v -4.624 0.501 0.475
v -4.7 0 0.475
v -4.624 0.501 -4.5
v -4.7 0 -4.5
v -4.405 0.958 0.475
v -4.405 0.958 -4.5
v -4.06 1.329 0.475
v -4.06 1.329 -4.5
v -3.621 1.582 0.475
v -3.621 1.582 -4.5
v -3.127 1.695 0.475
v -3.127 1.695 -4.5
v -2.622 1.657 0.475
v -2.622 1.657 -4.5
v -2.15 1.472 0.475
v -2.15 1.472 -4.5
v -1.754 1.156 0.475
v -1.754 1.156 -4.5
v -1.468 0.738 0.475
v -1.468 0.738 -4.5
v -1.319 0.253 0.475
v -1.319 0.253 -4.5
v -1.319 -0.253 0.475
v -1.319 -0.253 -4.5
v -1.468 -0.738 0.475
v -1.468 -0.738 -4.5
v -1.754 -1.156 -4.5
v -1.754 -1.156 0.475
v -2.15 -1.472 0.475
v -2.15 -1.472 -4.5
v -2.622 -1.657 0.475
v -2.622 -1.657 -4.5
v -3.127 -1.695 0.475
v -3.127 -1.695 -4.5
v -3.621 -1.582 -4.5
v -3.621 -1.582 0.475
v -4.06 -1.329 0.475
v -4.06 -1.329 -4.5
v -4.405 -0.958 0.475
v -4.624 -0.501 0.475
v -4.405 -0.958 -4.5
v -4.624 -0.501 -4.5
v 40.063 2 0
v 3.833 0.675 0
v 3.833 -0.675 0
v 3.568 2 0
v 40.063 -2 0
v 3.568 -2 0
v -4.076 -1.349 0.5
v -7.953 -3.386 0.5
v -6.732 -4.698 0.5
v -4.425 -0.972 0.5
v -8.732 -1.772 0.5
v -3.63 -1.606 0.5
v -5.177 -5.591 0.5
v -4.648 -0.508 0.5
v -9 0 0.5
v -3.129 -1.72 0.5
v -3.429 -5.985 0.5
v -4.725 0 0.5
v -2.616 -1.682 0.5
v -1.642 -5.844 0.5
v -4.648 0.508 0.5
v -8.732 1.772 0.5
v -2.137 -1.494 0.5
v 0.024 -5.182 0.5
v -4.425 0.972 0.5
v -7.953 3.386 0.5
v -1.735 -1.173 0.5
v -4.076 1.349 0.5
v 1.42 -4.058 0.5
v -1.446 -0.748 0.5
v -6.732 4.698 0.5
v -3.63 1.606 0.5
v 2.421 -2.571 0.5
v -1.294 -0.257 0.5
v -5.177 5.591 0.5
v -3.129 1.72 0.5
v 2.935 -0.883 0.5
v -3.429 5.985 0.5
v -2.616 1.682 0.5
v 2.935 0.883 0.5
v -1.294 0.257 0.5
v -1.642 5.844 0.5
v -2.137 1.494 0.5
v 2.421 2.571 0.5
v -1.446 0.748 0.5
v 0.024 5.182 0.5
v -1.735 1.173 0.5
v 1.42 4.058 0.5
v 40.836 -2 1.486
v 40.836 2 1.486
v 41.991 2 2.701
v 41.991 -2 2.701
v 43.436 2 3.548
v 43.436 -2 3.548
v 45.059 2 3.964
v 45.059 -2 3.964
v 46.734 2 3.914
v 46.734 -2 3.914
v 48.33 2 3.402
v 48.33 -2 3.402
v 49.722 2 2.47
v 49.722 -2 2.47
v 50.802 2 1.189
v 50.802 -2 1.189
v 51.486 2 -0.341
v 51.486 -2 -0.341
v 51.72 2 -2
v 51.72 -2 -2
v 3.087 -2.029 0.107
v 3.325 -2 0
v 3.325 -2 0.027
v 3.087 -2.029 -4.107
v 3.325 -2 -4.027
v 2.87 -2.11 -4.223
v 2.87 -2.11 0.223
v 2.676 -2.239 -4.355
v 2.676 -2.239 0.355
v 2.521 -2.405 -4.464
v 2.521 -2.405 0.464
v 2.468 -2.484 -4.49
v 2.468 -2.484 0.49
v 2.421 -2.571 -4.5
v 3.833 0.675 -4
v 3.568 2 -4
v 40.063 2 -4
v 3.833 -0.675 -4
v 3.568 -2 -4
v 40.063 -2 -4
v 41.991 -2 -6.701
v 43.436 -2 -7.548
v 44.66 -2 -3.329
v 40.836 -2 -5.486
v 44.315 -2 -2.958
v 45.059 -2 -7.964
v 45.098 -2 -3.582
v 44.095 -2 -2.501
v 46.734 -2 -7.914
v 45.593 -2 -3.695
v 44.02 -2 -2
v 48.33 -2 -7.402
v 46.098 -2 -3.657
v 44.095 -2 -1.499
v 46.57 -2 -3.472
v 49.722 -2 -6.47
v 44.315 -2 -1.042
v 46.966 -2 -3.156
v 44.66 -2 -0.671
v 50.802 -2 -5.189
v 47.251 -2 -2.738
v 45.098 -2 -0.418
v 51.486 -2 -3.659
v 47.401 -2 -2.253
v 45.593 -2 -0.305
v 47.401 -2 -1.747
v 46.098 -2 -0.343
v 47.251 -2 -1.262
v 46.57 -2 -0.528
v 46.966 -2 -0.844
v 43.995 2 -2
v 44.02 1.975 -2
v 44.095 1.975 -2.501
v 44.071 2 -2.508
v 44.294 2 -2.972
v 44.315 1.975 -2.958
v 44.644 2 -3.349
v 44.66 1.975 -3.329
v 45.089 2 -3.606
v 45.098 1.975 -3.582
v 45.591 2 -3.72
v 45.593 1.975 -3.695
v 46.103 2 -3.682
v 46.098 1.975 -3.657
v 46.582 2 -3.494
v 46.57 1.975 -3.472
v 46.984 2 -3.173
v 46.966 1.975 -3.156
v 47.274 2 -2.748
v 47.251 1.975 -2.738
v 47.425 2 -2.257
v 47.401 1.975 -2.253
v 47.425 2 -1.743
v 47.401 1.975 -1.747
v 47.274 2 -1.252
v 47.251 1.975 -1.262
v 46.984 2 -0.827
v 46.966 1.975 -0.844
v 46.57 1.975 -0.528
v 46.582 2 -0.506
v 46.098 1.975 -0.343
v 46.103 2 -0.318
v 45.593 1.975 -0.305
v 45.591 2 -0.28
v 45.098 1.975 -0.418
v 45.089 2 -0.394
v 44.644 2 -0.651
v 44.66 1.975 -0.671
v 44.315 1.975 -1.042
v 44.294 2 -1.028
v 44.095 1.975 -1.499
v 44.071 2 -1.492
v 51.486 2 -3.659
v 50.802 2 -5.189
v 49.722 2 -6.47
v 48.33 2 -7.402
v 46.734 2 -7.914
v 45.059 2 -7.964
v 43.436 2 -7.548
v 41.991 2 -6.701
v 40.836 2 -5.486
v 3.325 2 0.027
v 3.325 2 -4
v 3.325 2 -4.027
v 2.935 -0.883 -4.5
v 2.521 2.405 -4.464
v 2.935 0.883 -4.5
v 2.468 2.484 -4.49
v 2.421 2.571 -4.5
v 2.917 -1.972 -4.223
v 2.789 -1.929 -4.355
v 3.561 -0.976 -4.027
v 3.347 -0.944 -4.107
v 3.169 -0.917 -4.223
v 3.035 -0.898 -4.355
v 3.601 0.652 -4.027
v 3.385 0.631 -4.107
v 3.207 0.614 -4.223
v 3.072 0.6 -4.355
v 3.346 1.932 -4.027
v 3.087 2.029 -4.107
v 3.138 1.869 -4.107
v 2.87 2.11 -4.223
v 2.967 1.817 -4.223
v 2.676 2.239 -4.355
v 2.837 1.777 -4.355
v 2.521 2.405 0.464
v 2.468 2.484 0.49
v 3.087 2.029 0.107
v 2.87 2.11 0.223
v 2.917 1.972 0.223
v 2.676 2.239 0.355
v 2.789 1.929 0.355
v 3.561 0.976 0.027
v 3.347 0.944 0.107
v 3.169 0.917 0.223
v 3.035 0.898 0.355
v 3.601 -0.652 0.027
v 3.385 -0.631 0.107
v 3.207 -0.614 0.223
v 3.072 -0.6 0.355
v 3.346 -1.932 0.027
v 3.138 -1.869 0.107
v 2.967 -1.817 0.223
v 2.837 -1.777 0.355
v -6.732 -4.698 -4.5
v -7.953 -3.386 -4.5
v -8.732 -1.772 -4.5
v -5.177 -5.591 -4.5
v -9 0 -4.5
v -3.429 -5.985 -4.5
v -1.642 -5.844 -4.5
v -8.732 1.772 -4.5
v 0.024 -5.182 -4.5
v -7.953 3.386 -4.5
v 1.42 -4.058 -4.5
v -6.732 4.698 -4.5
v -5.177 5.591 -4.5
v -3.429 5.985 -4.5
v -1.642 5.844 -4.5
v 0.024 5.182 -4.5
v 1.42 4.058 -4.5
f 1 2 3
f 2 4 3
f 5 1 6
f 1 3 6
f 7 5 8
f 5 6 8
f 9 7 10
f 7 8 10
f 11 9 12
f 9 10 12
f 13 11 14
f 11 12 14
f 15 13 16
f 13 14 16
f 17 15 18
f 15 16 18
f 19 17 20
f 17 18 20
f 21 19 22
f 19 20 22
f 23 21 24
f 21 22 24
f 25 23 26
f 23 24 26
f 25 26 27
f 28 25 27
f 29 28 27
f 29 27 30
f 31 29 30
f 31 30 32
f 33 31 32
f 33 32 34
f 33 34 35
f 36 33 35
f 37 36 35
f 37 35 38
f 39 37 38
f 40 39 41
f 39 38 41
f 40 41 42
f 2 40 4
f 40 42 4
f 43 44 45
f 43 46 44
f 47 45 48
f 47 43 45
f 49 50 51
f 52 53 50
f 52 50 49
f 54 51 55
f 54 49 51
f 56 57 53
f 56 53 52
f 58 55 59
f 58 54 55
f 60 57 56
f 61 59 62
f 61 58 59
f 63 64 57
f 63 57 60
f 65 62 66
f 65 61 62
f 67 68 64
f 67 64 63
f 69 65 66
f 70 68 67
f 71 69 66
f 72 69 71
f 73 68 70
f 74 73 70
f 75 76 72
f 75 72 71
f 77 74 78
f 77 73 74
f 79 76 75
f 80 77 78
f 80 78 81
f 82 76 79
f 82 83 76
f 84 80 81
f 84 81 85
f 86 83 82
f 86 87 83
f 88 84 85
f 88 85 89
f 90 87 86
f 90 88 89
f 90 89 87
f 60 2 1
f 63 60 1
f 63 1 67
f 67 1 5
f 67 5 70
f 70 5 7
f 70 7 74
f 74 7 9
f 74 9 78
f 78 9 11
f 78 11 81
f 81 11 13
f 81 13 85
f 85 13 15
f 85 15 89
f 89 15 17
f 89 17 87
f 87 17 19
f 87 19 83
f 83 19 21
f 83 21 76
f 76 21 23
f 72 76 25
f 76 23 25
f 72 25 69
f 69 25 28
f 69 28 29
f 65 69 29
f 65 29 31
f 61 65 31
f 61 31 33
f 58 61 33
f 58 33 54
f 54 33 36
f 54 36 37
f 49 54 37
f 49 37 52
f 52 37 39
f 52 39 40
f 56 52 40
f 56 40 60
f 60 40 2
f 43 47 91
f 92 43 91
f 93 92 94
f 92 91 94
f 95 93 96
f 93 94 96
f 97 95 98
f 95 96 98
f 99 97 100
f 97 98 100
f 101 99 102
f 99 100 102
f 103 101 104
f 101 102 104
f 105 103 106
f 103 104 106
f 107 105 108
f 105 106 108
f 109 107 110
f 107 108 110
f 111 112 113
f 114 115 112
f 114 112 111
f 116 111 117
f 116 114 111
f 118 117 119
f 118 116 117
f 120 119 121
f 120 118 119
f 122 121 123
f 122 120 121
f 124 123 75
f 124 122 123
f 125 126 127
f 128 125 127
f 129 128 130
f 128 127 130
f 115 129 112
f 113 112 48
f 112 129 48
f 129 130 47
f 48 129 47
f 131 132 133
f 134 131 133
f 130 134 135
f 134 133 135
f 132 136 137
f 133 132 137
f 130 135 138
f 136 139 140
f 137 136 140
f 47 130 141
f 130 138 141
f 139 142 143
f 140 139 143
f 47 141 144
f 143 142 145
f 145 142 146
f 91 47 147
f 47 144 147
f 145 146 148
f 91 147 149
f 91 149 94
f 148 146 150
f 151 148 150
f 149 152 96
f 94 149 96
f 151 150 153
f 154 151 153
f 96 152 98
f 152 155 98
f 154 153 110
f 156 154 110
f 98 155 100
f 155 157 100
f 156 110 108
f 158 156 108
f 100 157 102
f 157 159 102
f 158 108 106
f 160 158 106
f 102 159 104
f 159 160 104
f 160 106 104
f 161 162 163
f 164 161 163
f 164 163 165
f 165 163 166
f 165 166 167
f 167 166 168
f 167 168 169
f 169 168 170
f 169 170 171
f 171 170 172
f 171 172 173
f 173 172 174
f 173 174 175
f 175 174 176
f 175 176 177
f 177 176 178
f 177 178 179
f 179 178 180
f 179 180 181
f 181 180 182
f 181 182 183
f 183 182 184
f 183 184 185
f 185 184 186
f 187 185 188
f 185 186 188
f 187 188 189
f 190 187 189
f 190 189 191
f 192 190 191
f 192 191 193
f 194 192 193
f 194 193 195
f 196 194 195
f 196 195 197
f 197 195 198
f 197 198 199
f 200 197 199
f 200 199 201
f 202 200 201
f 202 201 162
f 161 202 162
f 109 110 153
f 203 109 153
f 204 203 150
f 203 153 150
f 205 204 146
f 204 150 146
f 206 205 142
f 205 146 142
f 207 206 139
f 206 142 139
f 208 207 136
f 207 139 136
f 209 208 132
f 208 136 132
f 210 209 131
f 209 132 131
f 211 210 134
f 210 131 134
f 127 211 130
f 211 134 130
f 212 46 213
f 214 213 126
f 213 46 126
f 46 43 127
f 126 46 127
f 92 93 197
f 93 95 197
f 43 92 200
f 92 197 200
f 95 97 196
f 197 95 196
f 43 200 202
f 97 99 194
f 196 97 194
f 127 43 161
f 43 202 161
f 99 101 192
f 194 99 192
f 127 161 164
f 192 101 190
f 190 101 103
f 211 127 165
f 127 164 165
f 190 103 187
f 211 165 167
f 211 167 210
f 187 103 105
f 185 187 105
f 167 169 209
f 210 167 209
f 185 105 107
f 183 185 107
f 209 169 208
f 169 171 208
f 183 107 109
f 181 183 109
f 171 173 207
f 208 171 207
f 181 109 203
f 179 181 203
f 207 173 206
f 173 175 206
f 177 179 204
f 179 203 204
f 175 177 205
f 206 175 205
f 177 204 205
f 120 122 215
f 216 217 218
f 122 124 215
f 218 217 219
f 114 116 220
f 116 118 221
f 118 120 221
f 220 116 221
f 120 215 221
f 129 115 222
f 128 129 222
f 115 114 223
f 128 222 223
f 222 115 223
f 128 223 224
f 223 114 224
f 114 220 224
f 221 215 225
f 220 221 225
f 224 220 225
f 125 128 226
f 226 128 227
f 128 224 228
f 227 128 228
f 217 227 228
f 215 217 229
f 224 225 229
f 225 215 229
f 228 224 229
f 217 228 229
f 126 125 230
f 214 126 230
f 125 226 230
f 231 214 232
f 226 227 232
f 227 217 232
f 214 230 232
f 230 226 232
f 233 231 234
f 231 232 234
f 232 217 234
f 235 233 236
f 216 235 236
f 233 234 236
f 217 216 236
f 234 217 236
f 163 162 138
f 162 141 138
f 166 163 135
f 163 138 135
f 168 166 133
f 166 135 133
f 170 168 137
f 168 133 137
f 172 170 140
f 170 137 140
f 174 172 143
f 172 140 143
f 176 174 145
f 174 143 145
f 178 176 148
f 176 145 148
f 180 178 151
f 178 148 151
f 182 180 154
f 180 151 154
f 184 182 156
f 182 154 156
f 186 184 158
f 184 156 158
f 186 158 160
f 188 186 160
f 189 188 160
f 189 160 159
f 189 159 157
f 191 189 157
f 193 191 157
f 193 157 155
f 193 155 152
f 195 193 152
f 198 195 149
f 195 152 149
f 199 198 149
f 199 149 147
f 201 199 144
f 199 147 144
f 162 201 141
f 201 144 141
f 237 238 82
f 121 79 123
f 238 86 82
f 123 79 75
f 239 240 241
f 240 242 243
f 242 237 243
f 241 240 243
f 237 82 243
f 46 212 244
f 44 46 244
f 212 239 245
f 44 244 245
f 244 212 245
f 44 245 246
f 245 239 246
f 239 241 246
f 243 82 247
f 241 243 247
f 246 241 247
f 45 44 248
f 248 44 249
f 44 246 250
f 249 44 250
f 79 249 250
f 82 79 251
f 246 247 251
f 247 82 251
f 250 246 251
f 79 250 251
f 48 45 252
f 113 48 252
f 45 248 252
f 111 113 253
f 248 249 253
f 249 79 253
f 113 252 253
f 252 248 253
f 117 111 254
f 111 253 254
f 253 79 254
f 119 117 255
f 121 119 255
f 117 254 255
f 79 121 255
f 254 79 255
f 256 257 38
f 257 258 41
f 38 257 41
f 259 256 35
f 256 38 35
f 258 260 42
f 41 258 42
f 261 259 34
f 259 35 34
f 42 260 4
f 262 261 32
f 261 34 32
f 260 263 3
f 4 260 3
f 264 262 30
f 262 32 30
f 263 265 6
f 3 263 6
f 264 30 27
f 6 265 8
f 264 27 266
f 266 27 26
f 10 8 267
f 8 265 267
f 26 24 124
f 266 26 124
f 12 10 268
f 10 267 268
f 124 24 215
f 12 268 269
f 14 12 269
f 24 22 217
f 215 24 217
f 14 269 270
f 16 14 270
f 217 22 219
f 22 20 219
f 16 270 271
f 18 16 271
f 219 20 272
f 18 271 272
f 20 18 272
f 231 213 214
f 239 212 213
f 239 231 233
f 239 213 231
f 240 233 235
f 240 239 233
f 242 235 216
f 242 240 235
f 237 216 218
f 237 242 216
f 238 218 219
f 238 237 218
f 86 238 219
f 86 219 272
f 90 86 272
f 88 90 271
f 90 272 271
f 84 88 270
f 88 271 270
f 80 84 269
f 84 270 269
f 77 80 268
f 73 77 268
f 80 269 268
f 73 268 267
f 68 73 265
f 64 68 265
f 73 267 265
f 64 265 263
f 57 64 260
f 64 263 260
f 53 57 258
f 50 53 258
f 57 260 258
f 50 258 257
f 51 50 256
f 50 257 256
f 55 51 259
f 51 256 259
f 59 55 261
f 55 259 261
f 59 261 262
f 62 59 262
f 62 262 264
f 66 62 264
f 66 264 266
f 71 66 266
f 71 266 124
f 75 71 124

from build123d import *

# Parameters (mm, degrees)
BOSS_EXTRUDE10_DEPTH           = 2.5
BOSS_EXTRUDE10_DEPTH_BACK      = 2.5
SKETCH7_R                      = 6
BOSS_EXTRUDE11_DEPTH           = 2
BOSS_EXTRUDE11_DEPTH_BACK      = 2
FILLET4_R                      = 1
M3_CLEARANCE_HOLE1_D           = 3.4
M3_CLEARANCE_HOLE1_CSINK_D     = 3.45
M3_CLEARANCE_HOLE1_CSINK_ANGLE = 90
M3_CLEARANCE_HOLE2_D           = 3.4
M3_CLEARANCE_HOLE2_CSINK_D     = 3.45
M3_CLEARANCE_HOLE2_CSINK_ANGLE = 90


with BuildPart() as part:
    # Sketch7 → Boss-Extrude10 (new, two sides: drawn at the far end of the back side and taken through both)
    with BuildSketch(Plane.XY.offset(-2).offset(-BOSS_EXTRUDE10_DEPTH_BACK)):
        with Locations((-3, 0)):
            Circle(SKETCH7_R)
    extrude(amount=BOSS_EXTRUDE10_DEPTH + BOSS_EXTRUDE10_DEPTH_BACK)

    # Sketch4 → Boss-Extrude11 (add, two sides: drawn at the far end of the back side and taken through both)
    with BuildSketch(Plane(origin=(0, 0, 0), x_dir=(1, 0, 0), z_dir=(0, 1, 0)).offset(-BOSS_EXTRUDE11_DEPTH_BACK)):
        with BuildLine():
            ThreePointArc((40.062693756, 4), (39.719548005, 2), (40.062693756, 0))
            Line((40.062693756, 0), (45.719548005, 0))
            Line((45.719548005, 0), (45.719548005, 4))
            Line((45.719548005, 4), (40.062693756, 4))
        make_face()
        with BuildLine():
            Line((45.719548005, 0), (40.062693756, 0))
            ThreePointArc((40.062693756, 0), (46.734159878, -3.913591358), (51.719548005, 2))
            ThreePointArc((51.719548005, 2), (46.734159878, 7.913591358), (40.062693756, 4))
            Line((40.062693756, 4), (45.719548005, 4))
            Line((45.719548005, 4), (45.719548005, 0))
        make_face()
        with BuildLine():
            Line((0, 4), (0, 0))
            Line((0, 0), (40.062693756, 0))
            ThreePointArc((40.062693756, 0), (39.719548005, 2), (40.062693756, 4))
            Line((40.062693756, 4), (0, 4))
        make_face()
    extrude(amount=BOSS_EXTRUDE11_DEPTH + BOSS_EXTRUDE11_DEPTH_BACK)

    # Fillet4
    # the kernel refuses this fillet: 1 mm, written as the material it adds along each edge
    with BuildSketch(Plane(origin=(2.656854249, 2, 0), x_dir=(-0.381458859418171, 0.9243858169462511, 1.7363680755605478e-15), z_dir=(0, 0, -1)), Plane(origin=(2.656854249, -2, -4), x_dir=(-0.3814588594181449, -0.924385816946262, 1.7363680755604279e-15), z_dir=(0, 0, 1))) as fillet4_piece_1:
        with BuildLine():
            CenterArc((0.669685328, 0.998672259), FILLET4_R, 202.42407708, 64.623066475)
            Line((-0.254700489, 0.6172134), (-0.273188205, 0.609584223))
            Line((-0.273188205, 0.609584223), (-0.018487716, -0.007629177))
            Line((-0.018487716, -0.007629177), (0.001030285, -0.019973445))
            ThreePointArc((0.001030285, -0.019973445), (0.309085536, -0.012033556), (0.617140787, -0.019973445))
            Line((0.617140787, -0.019973445), (0.618171072, 0))
        make_face()
    extrude(amount=4)
    with BuildSketch(Plane(origin=(-3, 0, -4), x_dir=(0.764399035602867, -0.6447434484889372, 0), z_dir=(-0.6447434484889372, -0.764399035602867, 0))) as fillet4_piece_2_section:
        with BuildLine():
            CenterArc((6.866025404, -1), FILLET4_R, 90, 60)
            Line((6.866025404, 0), (6.866025404, 0.02))
            Line((6.866025404, 0.02), (6, 0.02))
            Line((6, 0.02), (5.98, 0))
            ThreePointArc((5.98, 0), (5.98, -0.25), (5.982679492, -0.49))
            Line((5.982679492, -0.49), (6, -0.5))
        make_face()
    fillet4_piece_2 = revolve(axis=Axis((-3, 0, -4), (0, 0, 1)), revolution_arc=40.146442844, mode=Mode.PRIVATE)
    fillet4_piece_2 = split(fillet4_piece_2, bisect_by=Plane(origin=(3.105396532, -2, -4.129597007), z_dir=(0, 1, 0)), keep=Keep.TOP, mode=Mode.PRIVATE)
    add(fillet4_piece_2)
    with BuildSketch(Plane(origin=(-3, 0, 0), x_dir=(0.7643990356028665, 0.6447434484889378, 0), z_dir=(-0.6447434484889378, 0.7643990356028665, 0))) as fillet4_piece_3_section:
        with BuildLine():
            CenterArc((6.866025404, -1), FILLET4_R, 90, 60)
            Line((6.866025404, 0), (6.866025404, 0.02))
            Line((6.866025404, 0.02), (6, 0.02))
            Line((6, 0.02), (5.98, 0))
            ThreePointArc((5.98, 0), (5.98, -0.25), (5.982679492, -0.49))
            Line((5.982679492, -0.49), (6, -0.5))
        make_face()
    fillet4_piece_3 = revolve(axis=Axis((-3, 0, 0), (0, 0, -1)), revolution_arc=40.146442844, mode=Mode.PRIVATE)
    fillet4_piece_3 = split(fillet4_piece_3, bisect_by=Plane(origin=(3.105396532, 2, 0.129597007), z_dir=(0, -1, 0)), keep=Keep.TOP, mode=Mode.PRIVATE)
    add(fillet4_piece_3)
    with BuildSketch(Plane(origin=(-3, 0, 0), x_dir=(1, 0, 0), z_dir=(0, 1, 0))) as fillet4_piece_4_section:
        with BuildLine():
            CenterArc((6.866025404, -1), FILLET4_R, 90, 60)
            Line((6.866025404, 0), (6.866025404, 0.02))
            Line((6.866025404, 0.02), (6, 0.02))
            Line((6, 0.02), (5.98, 0))
            ThreePointArc((5.98, 0), (5.98, -0.25), (5.982679492, -0.49))
            Line((5.982679492, -0.49), (6, -0.5))
        make_face()
    fillet4_piece_4 = revolve(axis=Axis((-3, 0, 0), (0, 0, -1)), revolution_arc=40.146442844, mode=Mode.PRIVATE)
    fillet4_piece_4 = split(fillet4_piece_4, bisect_by=Plane(origin=(3.105396981, -2, 0.129596926), z_dir=(0, 1, 0)), keep=Keep.TOP, mode=Mode.PRIVATE)
    add(fillet4_piece_4)
    with BuildSketch(Plane(origin=(-3, 0, -4), x_dir=(1, 0, 0), z_dir=(0, -1, 0))) as fillet4_piece_5_section:
        with BuildLine():
            CenterArc((6.866025404, -1), FILLET4_R, 90, 60)
            Line((6.866025404, 0), (6.866025404, 0.02))
            Line((6.866025404, 0.02), (6, 0.02))
            Line((6, 0.02), (5.98, 0))
            ThreePointArc((5.98, 0), (5.98, -0.25), (5.982679492, -0.49))
            Line((5.982679492, -0.49), (6, -0.5))
        make_face()
    fillet4_piece_5 = revolve(axis=Axis((-3, 0, -4), (0, 0, 1)), revolution_arc=40.146442844, mode=Mode.PRIVATE)
    fillet4_piece_5 = split(fillet4_piece_5, bisect_by=Plane(origin=(3.105396981, 2, -4.129596926), z_dir=(0, -1, 0)), keep=Keep.TOP, mode=Mode.PRIVATE)
    add(fillet4_piece_5)
    with BuildSketch(Plane(origin=(-3, 0, 0), x_dir=(0.7643990356028665, 0.6447434484889378, 0), z_dir=(-0.6447434484889378, 0.7643990356028665, 0))) as fillet4_piece_6a_section:
        with BuildLine():
            CenterArc((6.866025404, -1), FILLET4_R, 90, 60)
            Line((6.866025404, 0), (6.866025404, 0.02))
            Line((6.866025404, 0.02), (6, 0.02))
            Line((6, 0.02), (5.98, 0))
            ThreePointArc((5.98, 0), (5.98, -0.25), (5.982679492, -0.49))
            Line((5.982679492, -0.49), (6, -0.5))
        make_face()
    fillet4_piece_6a = revolve(axis=Axis((-3, 0, 0), (0, 0, -1)), revolution_arc=40.146442844, mode=Mode.PRIVATE)
    fillet4_piece_6a = split(fillet4_piece_6a, bisect_by=Plane(origin=(2.392166005, 2, 0.125287607), z_dir=(0, 1, 0)), keep=Keep.TOP, mode=Mode.PRIVATE)
    with BuildSketch(Plane(origin=(2.656854249, 2, 1.669252677), x_dir=(-0.38145885941817037, 0.9243858169462514, 1.7363680755605446e-15), z_dir=(0, 0, -1))) as fillet4_piece_6b_section:
        with BuildLine():
            CenterArc((0.669685328, 0.998672259), FILLET4_R, 202.42407708, 64.623066475)
            Line((-0.254700489, 0.6172134), (-0.273188205, 0.609584223))
            Line((-0.273188205, 0.609584223), (-0.018487716, -0.007629177))
            Line((-0.018487716, -0.007629177), (0.001030285, -0.019973445))
            ThreePointArc((0.001030285, -0.019973445), (0.309085536, -0.012033556), (0.617140787, -0.019973445))
            Line((0.617140787, -0.019973445), (0.618171072, 0))
        make_face()
    fillet4_piece_6b = extrude(amount=5.669252677, mode=Mode.PRIVATE)
    fillet4_piece_6b = split(fillet4_piece_6b, bisect_by=Plane(origin=(2.758670991, 2.124773094, 0.5), z_dir=(0, 0, -1)), keep=Keep.TOP, mode=Mode.PRIVATE)
    fillet4_piece_6b = split(fillet4_piece_6b, bisect_by=Plane(origin=(2.758670991, 2.124773094, 0), z_dir=(0, 0, 1)), keep=Keep.TOP, mode=Mode.PRIVATE)
    fillet4_piece_6 = fillet4_piece_6a & fillet4_piece_6b
    add(fillet4_piece_6)
    with BuildSketch(Plane(origin=(-3, 0, -4), x_dir=(1, 0, 0), z_dir=(0, -1, 0))) as fillet4_piece_7a_section:
        with BuildLine():
            CenterArc((6.866025404, -1), FILLET4_R, 90, 60)
            Line((6.866025404, 0), (6.866025404, 0.02))
            Line((6.866025404, 0.02), (6, 0.02))
            Line((6, 0.02), (5.98, 0))
            ThreePointArc((5.98, 0), (5.98, -0.25), (5.982679492, -0.49))
            Line((5.982679492, -0.49), (6, -0.5))
        make_face()
    fillet4_piece_7a = revolve(axis=Axis((-3, 0, -4), (0, 0, 1)), revolution_arc=40.146442844, mode=Mode.PRIVATE)
    fillet4_piece_7a = split(fillet4_piece_7a, bisect_by=Plane(origin=(2.392165487, 2, -4.125287706), z_dir=(0, 1, 0)), keep=Keep.TOP, mode=Mode.PRIVATE)
    with BuildSketch(Plane(origin=(2.656854249, 2, 0), x_dir=(-0.381458859418171, 0.9243858169462511, 1.7363680755605478e-15), z_dir=(0, 0, -1))) as fillet4_piece_7b_section:
        with BuildLine():
            CenterArc((0.669685328, 0.998672259), FILLET4_R, 202.42407708, 64.623066475)
            Line((-0.254700489, 0.6172134), (-0.273188205, 0.609584223))
            Line((-0.273188205, 0.609584223), (-0.018487716, -0.007629177))
            Line((-0.018487716, -0.007629177), (0.001030285, -0.019973445))
            ThreePointArc((0.001030285, -0.019973445), (0.309085536, -0.012033556), (0.617140787, -0.019973445))
            Line((0.617140787, -0.019973445), (0.618171072, 0))
        make_face()
    fillet4_piece_7b = extrude(amount=5.669252677, mode=Mode.PRIVATE)
    fillet4_piece_7b = split(fillet4_piece_7b, bisect_by=Plane(origin=(2.758670991, 2.124773094, -4.5), z_dir=(0, 0, 1)), keep=Keep.TOP, mode=Mode.PRIVATE)
    fillet4_piece_7b = split(fillet4_piece_7b, bisect_by=Plane(origin=(2.758670991, 2.124773094, -4), z_dir=(0, 0, -1)), keep=Keep.TOP, mode=Mode.PRIVATE)
    fillet4_piece_7 = fillet4_piece_7a & fillet4_piece_7b
    add(fillet4_piece_7)
    with BuildSketch(Plane(origin=(2.656854249, -2, -5.669252677), x_dir=(-0.38145885941816965, -0.9243858169462517, 1.7363680755605413e-15), z_dir=(0, 0, 1))) as fillet4_piece_8a_section:
        with BuildLine():
            CenterArc((0.669685328, 0.998672259), FILLET4_R, 202.42407708, 64.623066475)
            Line((-0.254700489, 0.6172134), (-0.273188205, 0.609584223))
            Line((-0.273188205, 0.609584223), (-0.018487716, -0.007629177))
            Line((-0.018487716, -0.007629177), (0.001030285, -0.019973445))
            ThreePointArc((0.001030285, -0.019973445), (0.309085536, -0.012033556), (0.617140787, -0.019973445))
            Line((0.617140787, -0.019973445), (0.618171072, 0))
        make_face()
    fillet4_piece_8a = extrude(amount=5.669252677, mode=Mode.PRIVATE)
    fillet4_piece_8a = split(fillet4_piece_8a, bisect_by=Plane(origin=(2.758670991, -2.124773094, -4.5), z_dir=(0, 0, 1)), keep=Keep.TOP, mode=Mode.PRIVATE)
    fillet4_piece_8a = split(fillet4_piece_8a, bisect_by=Plane(origin=(2.758670991, -2.124773094, -4), z_dir=(0, 0, -1)), keep=Keep.TOP, mode=Mode.PRIVATE)
    with BuildSketch(Plane(origin=(-3, 0, -4), x_dir=(0.764399035602867, -0.6447434484889372, 0), z_dir=(-0.6447434484889372, -0.764399035602867, 0))) as fillet4_piece_8b_section:
        with BuildLine():
            CenterArc((6.866025404, -1), FILLET4_R, 90, 60)
            Line((6.866025404, 0), (6.866025404, 0.02))
            Line((6.866025404, 0.02), (6, 0.02))
            Line((6, 0.02), (5.98, 0))
            ThreePointArc((5.98, 0), (5.98, -0.25), (5.982679492, -0.49))
            Line((5.982679492, -0.49), (6, -0.5))
        make_face()
    fillet4_piece_8b = revolve(axis=Axis((-3, 0, -4), (0, 0, 1)), revolution_arc=40.146442844, mode=Mode.PRIVATE)
    fillet4_piece_8b = split(fillet4_piece_8b, bisect_by=Plane(origin=(2.392166005, -2, -4.125287607), z_dir=(0, -1, 0)), keep=Keep.TOP, mode=Mode.PRIVATE)
    fillet4_piece_8 = fillet4_piece_8a & fillet4_piece_8b
    add(fillet4_piece_8)
    with BuildSketch(Plane(origin=(-3, 0, 0), x_dir=(1, 0, 0), z_dir=(0, 1, 0))) as fillet4_piece_9a_section:
        with BuildLine():
            CenterArc((6.866025404, -1), FILLET4_R, 90, 60)
            Line((6.866025404, 0), (6.866025404, 0.02))
            Line((6.866025404, 0.02), (6, 0.02))
            Line((6, 0.02), (5.98, 0))
            ThreePointArc((5.98, 0), (5.98, -0.25), (5.982679492, -0.49))
            Line((5.982679492, -0.49), (6, -0.5))
        make_face()
    fillet4_piece_9a = revolve(axis=Axis((-3, 0, 0), (0, 0, -1)), revolution_arc=40.146442844, mode=Mode.PRIVATE)
    fillet4_piece_9a = split(fillet4_piece_9a, bisect_by=Plane(origin=(2.392165487, -2, 0.125287706), z_dir=(0, -1, 0)), keep=Keep.TOP, mode=Mode.PRIVATE)
    with BuildSketch(Plane(origin=(2.656854249, -2, -4), x_dir=(-0.3814588594181449, -0.924385816946262, 1.7363680755604279e-15), z_dir=(0, 0, 1))) as fillet4_piece_9b_section:
        with BuildLine():
            CenterArc((0.669685328, 0.998672259), FILLET4_R, 202.42407708, 64.623066475)
            Line((-0.254700489, 0.6172134), (-0.273188205, 0.609584223))
            Line((-0.273188205, 0.609584223), (-0.018487716, -0.007629177))
            Line((-0.018487716, -0.007629177), (0.001030285, -0.019973445))
            ThreePointArc((0.001030285, -0.019973445), (0.309085536, -0.012033556), (0.617140787, -0.019973445))
            Line((0.617140787, -0.019973445), (0.618171072, 0))
        make_face()
    fillet4_piece_9b = extrude(amount=5.669252677, mode=Mode.PRIVATE)
    fillet4_piece_9b = split(fillet4_piece_9b, bisect_by=Plane(origin=(2.758670991, -2.124773094, 0.5), z_dir=(0, 0, -1)), keep=Keep.TOP, mode=Mode.PRIVATE)
    fillet4_piece_9b = split(fillet4_piece_9b, bisect_by=Plane(origin=(2.758670991, -2.124773094, 0), z_dir=(0, 0, 1)), keep=Keep.TOP, mode=Mode.PRIVATE)
    fillet4_piece_9 = fillet4_piece_9a & fillet4_piece_9b
    add(fillet4_piece_9)

    # M3 Clearance Hole1 (through all)
    with Locations(Plane.XY.offset(0.5)):
        with Locations((-3, 0)):
            CounterSinkHole(M3_CLEARANCE_HOLE1_D / 2, M3_CLEARANCE_HOLE1_CSINK_D / 2, counter_sink_angle=M3_CLEARANCE_HOLE1_CSINK_ANGLE)

    # M3 Clearance Hole2 (through all)
    with Locations(Plane(origin=(0, 2, 0), x_dir=(1, 0, 0), z_dir=(0, 1, 0))):
        with Locations((45.719548005, 2)):
            CounterSinkHole(M3_CLEARANCE_HOLE2_D / 2, M3_CLEARANCE_HOLE2_CSINK_D / 2, counter_sink_angle=M3_CLEARANCE_HOLE2_CSINK_ANGLE)


solid = part.part
